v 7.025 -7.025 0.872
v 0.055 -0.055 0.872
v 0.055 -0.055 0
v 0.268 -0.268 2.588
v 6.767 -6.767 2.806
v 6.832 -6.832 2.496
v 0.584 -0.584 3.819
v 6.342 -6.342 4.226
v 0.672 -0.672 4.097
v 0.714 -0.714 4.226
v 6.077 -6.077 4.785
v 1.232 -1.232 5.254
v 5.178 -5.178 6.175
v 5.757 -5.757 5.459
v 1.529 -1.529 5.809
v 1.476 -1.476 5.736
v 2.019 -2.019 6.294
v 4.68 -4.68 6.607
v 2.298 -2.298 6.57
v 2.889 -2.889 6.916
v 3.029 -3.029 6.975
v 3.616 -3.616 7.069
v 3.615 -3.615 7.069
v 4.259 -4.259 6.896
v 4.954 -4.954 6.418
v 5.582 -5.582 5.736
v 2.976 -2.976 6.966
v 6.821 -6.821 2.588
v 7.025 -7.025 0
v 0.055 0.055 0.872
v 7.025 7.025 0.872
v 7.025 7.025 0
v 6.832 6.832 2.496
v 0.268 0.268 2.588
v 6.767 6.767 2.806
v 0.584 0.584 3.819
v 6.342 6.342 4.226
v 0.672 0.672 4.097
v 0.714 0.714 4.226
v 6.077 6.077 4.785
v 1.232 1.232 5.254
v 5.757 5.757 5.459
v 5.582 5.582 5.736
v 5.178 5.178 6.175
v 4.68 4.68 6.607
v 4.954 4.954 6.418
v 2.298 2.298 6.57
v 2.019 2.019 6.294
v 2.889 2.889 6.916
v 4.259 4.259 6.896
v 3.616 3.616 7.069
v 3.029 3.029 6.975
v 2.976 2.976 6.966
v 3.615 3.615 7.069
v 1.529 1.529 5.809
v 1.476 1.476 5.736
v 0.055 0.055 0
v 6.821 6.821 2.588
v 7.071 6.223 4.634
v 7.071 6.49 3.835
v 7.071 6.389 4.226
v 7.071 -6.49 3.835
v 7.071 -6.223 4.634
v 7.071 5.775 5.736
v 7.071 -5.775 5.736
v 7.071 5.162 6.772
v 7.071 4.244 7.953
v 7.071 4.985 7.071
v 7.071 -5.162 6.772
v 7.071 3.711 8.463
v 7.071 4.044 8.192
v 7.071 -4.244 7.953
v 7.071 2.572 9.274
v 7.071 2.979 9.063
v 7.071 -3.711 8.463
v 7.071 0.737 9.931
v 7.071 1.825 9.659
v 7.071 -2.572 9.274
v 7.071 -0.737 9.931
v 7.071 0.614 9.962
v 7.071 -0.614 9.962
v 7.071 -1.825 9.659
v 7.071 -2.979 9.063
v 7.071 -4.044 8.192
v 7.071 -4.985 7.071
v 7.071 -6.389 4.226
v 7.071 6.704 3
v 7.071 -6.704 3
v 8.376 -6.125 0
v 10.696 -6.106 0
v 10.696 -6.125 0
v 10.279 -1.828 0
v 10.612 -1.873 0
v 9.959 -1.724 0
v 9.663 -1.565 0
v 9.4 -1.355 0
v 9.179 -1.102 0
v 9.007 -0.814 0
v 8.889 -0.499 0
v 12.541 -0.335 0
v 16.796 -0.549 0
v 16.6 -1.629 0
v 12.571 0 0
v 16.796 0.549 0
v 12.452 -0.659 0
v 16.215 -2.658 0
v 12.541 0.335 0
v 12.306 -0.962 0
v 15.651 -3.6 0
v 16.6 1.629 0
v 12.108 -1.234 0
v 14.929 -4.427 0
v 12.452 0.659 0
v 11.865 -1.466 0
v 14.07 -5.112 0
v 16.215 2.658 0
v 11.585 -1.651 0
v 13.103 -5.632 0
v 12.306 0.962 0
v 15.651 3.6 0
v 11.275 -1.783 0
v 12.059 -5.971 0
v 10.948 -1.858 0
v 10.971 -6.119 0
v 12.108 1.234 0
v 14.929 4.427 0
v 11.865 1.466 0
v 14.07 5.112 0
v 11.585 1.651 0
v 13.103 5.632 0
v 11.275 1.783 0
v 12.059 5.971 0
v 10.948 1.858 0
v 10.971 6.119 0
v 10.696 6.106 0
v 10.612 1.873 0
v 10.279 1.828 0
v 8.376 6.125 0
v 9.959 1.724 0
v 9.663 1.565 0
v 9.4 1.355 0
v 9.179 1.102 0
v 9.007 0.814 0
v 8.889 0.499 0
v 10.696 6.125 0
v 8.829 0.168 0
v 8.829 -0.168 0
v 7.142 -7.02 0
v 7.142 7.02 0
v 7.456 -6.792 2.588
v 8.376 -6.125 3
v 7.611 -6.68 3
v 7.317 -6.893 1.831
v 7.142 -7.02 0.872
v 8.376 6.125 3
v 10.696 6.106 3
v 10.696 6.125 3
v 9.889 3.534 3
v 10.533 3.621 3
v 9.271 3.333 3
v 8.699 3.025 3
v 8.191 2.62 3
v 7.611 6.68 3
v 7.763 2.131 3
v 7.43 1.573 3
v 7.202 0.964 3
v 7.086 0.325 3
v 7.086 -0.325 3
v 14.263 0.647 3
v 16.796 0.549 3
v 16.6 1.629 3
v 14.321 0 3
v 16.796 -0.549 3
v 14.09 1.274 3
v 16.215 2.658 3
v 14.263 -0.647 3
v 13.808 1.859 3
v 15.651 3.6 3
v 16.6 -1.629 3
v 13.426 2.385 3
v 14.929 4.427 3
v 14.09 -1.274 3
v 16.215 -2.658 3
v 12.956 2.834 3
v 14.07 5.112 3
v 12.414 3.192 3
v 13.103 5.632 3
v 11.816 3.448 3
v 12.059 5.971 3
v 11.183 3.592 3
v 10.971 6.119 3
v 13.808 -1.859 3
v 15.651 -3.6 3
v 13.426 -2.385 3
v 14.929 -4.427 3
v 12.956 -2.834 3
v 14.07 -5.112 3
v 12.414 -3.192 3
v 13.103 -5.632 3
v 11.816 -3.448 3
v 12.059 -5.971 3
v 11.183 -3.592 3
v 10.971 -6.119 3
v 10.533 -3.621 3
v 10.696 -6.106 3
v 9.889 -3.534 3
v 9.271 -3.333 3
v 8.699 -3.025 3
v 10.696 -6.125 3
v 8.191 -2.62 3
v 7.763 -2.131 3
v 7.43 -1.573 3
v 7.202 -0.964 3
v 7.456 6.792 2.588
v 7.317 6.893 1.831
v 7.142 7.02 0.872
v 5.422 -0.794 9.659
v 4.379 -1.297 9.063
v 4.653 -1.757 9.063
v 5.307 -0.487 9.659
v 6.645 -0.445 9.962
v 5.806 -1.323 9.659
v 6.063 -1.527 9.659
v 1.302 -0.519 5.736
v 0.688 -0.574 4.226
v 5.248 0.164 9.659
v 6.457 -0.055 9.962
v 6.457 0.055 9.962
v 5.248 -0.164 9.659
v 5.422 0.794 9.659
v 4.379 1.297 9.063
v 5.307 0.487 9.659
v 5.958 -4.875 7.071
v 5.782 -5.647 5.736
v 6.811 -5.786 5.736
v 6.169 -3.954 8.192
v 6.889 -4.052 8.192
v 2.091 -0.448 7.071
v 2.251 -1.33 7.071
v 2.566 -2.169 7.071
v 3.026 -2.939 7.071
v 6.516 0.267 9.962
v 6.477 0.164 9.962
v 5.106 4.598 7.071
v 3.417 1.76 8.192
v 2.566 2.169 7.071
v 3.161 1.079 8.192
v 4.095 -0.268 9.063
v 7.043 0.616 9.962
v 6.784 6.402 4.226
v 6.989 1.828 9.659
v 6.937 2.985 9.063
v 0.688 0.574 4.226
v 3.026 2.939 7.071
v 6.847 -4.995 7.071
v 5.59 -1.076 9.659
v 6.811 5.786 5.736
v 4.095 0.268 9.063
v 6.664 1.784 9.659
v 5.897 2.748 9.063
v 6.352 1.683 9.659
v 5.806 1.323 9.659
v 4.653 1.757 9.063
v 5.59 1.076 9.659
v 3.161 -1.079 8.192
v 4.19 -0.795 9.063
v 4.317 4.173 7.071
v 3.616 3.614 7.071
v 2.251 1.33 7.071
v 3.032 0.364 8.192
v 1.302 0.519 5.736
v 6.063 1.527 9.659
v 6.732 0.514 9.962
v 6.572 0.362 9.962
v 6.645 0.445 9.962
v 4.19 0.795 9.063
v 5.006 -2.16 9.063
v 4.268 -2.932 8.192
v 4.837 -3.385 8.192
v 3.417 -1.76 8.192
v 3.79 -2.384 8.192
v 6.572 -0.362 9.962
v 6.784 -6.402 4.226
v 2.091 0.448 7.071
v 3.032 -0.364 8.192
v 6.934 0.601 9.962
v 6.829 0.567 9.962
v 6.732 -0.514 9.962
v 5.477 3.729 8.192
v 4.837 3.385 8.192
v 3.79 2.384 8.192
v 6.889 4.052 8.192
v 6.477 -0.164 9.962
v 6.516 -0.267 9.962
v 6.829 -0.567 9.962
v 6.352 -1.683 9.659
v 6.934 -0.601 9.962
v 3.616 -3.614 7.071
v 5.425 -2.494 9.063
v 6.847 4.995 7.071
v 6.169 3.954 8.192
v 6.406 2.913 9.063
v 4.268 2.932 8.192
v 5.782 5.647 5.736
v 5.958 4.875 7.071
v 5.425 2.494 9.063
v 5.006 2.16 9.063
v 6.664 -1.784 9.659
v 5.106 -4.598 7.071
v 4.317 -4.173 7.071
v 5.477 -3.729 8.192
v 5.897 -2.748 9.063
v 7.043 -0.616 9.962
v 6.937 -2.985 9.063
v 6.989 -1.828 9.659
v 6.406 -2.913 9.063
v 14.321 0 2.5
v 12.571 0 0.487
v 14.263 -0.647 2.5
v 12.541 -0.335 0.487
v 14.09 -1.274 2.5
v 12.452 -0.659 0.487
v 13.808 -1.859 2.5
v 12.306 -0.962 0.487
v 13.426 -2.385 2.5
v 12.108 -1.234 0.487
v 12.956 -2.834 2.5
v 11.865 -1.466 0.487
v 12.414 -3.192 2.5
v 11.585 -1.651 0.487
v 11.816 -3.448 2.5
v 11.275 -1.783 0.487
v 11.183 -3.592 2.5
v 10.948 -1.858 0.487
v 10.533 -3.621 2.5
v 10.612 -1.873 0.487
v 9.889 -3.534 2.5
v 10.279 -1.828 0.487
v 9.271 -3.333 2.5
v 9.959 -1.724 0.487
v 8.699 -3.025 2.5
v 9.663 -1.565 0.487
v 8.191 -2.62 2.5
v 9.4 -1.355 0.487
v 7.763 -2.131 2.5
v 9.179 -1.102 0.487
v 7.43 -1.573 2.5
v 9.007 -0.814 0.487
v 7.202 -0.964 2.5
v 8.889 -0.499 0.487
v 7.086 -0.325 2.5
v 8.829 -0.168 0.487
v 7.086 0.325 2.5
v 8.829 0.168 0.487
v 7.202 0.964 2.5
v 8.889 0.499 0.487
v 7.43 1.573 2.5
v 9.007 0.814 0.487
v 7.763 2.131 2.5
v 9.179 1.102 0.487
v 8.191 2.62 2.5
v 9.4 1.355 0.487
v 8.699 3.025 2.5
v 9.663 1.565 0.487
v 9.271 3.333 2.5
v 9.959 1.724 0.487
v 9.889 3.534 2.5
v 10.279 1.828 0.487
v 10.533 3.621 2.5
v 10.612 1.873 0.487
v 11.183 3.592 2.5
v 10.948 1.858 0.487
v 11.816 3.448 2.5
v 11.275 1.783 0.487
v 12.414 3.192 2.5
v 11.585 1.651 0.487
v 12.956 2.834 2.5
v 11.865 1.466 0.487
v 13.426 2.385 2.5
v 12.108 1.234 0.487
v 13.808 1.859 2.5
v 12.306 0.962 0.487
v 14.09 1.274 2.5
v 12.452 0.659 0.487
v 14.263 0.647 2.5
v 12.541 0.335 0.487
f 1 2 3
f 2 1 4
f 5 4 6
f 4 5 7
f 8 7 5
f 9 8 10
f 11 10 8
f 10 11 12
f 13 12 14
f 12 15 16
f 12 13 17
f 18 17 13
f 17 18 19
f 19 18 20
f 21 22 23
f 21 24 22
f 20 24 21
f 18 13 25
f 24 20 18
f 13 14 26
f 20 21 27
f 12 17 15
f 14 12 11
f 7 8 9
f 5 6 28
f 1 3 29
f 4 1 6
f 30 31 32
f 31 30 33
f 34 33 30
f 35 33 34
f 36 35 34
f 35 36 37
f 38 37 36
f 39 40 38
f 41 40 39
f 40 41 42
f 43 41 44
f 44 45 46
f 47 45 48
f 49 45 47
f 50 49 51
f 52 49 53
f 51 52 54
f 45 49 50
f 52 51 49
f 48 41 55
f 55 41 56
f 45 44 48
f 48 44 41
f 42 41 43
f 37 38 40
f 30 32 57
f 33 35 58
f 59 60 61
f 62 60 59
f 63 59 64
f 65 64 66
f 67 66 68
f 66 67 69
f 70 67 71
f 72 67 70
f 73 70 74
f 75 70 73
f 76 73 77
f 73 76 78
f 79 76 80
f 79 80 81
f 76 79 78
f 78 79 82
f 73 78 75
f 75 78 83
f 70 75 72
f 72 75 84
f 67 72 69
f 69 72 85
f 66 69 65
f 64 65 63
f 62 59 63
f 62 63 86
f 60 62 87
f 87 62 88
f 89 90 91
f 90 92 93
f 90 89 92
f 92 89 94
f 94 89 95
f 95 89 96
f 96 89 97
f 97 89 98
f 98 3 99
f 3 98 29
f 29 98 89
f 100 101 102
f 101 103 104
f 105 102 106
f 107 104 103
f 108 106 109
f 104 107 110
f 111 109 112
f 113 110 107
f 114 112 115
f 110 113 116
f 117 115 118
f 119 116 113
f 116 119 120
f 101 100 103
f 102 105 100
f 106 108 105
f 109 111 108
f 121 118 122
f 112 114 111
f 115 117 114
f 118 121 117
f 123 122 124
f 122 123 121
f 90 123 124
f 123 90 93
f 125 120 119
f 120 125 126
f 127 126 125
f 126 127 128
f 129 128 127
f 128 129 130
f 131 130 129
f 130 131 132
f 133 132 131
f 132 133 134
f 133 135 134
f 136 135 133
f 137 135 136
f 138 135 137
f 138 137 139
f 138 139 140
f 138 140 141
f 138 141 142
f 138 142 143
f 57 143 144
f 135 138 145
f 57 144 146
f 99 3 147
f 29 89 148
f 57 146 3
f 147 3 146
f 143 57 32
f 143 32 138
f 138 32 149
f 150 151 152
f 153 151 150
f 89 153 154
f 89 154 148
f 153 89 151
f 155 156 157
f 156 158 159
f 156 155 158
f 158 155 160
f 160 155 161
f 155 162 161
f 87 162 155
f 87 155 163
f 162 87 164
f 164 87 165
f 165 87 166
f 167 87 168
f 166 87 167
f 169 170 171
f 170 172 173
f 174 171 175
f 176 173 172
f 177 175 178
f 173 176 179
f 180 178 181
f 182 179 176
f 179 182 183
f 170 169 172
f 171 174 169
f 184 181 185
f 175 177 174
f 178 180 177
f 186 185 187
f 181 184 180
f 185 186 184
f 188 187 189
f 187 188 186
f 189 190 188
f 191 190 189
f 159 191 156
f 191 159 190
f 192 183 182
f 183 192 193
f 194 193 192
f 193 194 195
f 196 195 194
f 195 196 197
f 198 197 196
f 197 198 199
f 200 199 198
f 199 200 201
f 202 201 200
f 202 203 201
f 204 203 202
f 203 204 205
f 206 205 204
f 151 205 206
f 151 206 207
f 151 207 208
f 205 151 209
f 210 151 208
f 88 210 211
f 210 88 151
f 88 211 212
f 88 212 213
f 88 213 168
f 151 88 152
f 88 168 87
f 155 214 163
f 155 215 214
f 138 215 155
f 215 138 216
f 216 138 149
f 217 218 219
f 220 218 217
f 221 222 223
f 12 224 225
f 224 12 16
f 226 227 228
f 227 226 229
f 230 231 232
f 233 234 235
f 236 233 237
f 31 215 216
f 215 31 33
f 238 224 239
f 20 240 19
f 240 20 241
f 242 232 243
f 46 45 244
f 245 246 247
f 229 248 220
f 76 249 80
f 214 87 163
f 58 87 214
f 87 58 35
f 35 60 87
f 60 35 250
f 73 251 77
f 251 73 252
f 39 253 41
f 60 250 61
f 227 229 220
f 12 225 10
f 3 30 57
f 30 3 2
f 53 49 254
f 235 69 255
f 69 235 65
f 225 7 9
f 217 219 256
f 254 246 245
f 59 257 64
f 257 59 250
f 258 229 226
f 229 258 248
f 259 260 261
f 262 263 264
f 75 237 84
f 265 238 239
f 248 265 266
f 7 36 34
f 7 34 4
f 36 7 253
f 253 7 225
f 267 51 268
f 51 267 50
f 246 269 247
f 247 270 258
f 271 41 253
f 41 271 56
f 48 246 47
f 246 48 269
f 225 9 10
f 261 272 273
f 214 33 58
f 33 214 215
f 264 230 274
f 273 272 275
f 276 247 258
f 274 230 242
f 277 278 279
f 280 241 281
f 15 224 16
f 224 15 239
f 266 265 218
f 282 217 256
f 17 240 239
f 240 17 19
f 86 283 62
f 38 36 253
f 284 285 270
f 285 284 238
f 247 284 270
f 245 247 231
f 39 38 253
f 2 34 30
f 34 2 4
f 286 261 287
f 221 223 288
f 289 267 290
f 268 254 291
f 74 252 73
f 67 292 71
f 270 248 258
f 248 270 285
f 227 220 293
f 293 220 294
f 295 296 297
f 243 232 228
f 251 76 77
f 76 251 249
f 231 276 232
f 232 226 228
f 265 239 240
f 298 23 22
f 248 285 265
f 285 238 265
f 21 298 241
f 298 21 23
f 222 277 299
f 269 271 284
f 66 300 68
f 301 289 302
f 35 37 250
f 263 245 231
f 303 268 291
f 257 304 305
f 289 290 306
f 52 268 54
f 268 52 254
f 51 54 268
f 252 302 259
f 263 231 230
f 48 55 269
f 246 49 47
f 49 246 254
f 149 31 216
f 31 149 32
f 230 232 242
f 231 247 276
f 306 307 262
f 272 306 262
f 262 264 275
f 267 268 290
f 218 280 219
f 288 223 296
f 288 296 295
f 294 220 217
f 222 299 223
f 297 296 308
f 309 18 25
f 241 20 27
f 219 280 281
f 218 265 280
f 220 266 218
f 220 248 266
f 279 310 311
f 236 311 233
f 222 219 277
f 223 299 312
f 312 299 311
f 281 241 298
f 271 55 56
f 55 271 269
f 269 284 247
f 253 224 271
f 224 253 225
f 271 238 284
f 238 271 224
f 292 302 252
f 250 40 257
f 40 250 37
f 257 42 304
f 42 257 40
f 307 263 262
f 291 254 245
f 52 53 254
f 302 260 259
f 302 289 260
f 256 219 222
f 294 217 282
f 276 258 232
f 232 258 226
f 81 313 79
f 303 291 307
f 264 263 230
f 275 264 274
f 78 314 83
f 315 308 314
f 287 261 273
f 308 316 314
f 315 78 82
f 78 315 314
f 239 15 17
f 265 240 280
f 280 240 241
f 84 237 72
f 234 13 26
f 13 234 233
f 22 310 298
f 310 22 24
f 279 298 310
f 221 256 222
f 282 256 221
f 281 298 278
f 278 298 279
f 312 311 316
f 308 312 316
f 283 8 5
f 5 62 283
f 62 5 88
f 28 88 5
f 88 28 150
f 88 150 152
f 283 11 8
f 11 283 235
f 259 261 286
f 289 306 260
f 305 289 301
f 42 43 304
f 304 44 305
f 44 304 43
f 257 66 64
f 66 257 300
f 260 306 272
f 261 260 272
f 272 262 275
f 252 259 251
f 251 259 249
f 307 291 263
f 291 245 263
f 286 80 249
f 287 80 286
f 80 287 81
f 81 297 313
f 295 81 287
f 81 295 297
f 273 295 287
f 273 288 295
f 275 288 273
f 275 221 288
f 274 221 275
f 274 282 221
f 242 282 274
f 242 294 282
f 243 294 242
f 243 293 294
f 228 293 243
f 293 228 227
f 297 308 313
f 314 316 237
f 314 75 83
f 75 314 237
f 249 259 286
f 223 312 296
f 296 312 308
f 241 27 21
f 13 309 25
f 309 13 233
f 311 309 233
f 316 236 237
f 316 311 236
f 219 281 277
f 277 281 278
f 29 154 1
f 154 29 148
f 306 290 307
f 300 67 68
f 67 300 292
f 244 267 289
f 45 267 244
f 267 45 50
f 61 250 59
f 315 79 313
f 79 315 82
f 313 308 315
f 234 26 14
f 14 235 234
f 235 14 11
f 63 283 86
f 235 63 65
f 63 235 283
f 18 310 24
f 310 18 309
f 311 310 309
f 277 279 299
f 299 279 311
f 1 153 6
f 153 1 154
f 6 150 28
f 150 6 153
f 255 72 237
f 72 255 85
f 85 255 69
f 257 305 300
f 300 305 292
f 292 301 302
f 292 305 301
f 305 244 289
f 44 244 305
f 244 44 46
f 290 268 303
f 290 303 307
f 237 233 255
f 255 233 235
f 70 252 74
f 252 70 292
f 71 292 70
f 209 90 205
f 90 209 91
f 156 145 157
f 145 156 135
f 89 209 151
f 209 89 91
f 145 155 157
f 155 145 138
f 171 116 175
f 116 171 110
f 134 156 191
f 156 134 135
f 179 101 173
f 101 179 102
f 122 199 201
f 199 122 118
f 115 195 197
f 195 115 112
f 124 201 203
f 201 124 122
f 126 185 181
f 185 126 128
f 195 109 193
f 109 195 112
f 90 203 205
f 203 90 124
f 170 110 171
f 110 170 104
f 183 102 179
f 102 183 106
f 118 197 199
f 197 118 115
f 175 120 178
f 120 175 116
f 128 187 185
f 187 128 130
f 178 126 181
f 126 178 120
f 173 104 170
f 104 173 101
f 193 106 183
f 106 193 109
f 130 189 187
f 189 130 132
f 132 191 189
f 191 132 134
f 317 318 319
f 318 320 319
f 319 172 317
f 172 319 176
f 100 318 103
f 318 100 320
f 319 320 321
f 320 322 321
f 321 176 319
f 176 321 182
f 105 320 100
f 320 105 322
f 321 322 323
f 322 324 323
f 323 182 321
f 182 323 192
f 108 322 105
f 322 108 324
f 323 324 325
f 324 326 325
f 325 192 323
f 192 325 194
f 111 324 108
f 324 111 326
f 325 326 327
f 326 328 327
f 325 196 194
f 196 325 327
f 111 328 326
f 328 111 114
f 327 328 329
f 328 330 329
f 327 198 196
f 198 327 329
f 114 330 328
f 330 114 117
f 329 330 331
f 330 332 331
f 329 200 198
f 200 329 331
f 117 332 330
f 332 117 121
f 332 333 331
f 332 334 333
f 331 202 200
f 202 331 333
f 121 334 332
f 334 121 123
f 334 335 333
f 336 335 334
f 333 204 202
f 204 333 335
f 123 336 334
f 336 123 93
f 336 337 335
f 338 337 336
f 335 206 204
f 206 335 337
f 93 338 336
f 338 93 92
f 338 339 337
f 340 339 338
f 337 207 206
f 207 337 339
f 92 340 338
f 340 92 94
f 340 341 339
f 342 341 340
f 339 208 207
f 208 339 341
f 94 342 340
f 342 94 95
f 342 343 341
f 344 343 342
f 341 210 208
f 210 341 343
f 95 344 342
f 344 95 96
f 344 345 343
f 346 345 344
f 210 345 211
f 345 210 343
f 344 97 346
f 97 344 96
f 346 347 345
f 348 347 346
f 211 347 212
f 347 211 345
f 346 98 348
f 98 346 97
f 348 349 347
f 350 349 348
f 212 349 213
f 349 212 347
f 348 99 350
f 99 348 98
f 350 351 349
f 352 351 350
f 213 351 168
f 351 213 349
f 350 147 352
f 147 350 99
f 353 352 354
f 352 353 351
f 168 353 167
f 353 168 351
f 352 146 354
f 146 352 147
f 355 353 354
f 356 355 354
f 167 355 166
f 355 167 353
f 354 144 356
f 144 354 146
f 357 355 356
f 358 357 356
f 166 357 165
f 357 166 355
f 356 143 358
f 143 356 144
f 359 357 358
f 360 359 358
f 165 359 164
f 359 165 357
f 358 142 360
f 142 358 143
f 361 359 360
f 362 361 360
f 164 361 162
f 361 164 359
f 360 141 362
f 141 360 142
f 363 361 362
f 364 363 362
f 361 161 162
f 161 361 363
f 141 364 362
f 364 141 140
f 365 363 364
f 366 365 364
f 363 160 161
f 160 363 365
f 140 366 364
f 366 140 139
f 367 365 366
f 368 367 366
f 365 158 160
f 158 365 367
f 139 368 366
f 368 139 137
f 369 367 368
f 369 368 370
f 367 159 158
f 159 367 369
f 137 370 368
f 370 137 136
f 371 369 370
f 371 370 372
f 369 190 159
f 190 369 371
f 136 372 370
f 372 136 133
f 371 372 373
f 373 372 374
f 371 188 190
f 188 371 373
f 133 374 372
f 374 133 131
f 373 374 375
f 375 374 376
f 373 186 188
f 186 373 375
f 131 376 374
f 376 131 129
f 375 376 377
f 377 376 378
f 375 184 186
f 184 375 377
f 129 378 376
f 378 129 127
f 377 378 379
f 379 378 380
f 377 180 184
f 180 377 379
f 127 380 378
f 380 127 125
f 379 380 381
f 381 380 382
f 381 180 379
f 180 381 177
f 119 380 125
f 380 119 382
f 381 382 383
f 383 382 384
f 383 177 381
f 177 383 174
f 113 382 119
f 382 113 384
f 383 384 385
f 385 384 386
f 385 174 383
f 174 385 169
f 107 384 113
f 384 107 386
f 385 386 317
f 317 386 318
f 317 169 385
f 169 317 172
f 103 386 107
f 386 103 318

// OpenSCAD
/*
 * Lid Postion Guide (Parametric), v0.42
 *
 * by Alex Franke (CodeCreations), Dec 2012
 * http://www.theFrankes.com
 * 
 * Licenced under Creative Commons Attribution - Non-Commercial - Share Alike 3.0 
 * 
 * DESCRIPTION: Serves as a guide for placing a rectangular lid onto a flat surface in 
 *   a specific position. 
 * 
 * INSTRUCTIONS:  Print 3-4 guides and install then with the lid in place, if possible. 
 * 
 * v0.42, Dec 28, 2012: Initial Release.
 * 
 * TODO: 
 *   * None at this time.
 */


/////////////////////////////////////////////////////////////////////////////
// User-defined values... 
/////////////////////////////////////////////////////////////////////////////

cornerAngle    = 90;   // Angle of corner the guild will be placed against
sideLength     = 10;   // The length of each side of the guide, extending from the corner
guideHeight    = 10;   // The height of the guide portion of the piece
bodyHeight     = 3;    // The height of the body portion that gets fastened down

shaftDiameter  = 3.75; // The diameter of the through-hole for the screw. #6=3.58
headDiameter   = 7.25; // The diameter of the head of the screw. #6=7.14
holePadding    = 2.5;  // The width of the material around the hole 
screwAngle     = 82;   // Countersink angle (angle of screw head -- 82 is pretty standard for wood 
                       //   screws.) Other common countersink angles are 60, 90, 100, 110, and 120. 

counterSink    = 0.5;  // Additional distance to inset the countersink

$fn            = 35;   // General curve quality


/////////////////////////////////////////////////////////////////////////////
// The code...
/////////////////////////////////////////////////////////////////////////////

wedgeLength = sideLength*cos(cornerAngle/2);
wedgeHeight = sideLength*sin(cornerAngle/2);
yHeight = (headDiameter/2-shaftDiameter/2)/tan(screwAngle/2); 

difference() {
	union() {
		intersection() {
	
			union() {
				wedge(wedgeLength, guideHeight, cornerAngle);
					linear_extrude(height=bodyHeight, convexity=4) {
						polygon(points=[
							[wedgeLength,wedgeHeight],
							[wedgeLength+headDiameter+holePadding,0],
							[wedgeLength,-wedgeHeight]
						]);
					}
			}
			translate([wedgeLength,0,0]) 
				scale([wedgeLength,wedgeLength,guideHeight]) 
					sphere(r=1) ;
		}
	
		rotate(180) 
			translate([-(wedgeLength+headDiameter/2),0,0]) 
				bracket(headDiameter/2,shaftDiameter/2,headDiameter/2,holePadding,bodyHeight);
	}
	
	rotate(180) 
		translate([-(wedgeLength+headDiameter/2),0,-counterSink]) 
			bracketHole(shaftDiameter/2,headDiameter/2,screwAngle,bodyHeight);
}


/////////////////////////////////////////////////////////////////////////////
// Modules...
/////////////////////////////////////////////////////////////////////////////

// length = end to hole center
module bracket(length, holeRadius, headRadius, holePadding, thickness) {
	union() {
		translate([length/2,0,thickness/2]) 	
			cube([length,(headRadius+holePadding)*2,thickness], center=true); 
		cylinder(h=thickness,r=headRadius+holePadding);
	}
}

module bracketHole(holeRadius, headRadius, headAngle, thickness) {
	translate([0,0,thickness]) 
	rotate_extrude(convexity=4) {
		polygon(points=[
			[0,-(thickness+1)-yHeight],
			[holeRadius,-(thickness+1)-yHeight],
			[holeRadius,-yHeight],
			[headRadius,0],
			[headRadius,thickness+1],
			[0,thickness+1]
		]);
	}
}

module wedge(length, height, angle) {

	x = length; 
	y = 2*x*tan(angle/2); 
	z = height;
	x2 = (y/2)/sin(angle/2);

	difference() {
		translate([0,-y/2,0]) 
			cube([x,y,z]);

		for(i=[-1,1])
			rotate([0,0,angle/2*i]) 
				translate([0,-y/2 +y/2*i,-0.5]) 
					cube([x2,y,z+1]);

	}
}
